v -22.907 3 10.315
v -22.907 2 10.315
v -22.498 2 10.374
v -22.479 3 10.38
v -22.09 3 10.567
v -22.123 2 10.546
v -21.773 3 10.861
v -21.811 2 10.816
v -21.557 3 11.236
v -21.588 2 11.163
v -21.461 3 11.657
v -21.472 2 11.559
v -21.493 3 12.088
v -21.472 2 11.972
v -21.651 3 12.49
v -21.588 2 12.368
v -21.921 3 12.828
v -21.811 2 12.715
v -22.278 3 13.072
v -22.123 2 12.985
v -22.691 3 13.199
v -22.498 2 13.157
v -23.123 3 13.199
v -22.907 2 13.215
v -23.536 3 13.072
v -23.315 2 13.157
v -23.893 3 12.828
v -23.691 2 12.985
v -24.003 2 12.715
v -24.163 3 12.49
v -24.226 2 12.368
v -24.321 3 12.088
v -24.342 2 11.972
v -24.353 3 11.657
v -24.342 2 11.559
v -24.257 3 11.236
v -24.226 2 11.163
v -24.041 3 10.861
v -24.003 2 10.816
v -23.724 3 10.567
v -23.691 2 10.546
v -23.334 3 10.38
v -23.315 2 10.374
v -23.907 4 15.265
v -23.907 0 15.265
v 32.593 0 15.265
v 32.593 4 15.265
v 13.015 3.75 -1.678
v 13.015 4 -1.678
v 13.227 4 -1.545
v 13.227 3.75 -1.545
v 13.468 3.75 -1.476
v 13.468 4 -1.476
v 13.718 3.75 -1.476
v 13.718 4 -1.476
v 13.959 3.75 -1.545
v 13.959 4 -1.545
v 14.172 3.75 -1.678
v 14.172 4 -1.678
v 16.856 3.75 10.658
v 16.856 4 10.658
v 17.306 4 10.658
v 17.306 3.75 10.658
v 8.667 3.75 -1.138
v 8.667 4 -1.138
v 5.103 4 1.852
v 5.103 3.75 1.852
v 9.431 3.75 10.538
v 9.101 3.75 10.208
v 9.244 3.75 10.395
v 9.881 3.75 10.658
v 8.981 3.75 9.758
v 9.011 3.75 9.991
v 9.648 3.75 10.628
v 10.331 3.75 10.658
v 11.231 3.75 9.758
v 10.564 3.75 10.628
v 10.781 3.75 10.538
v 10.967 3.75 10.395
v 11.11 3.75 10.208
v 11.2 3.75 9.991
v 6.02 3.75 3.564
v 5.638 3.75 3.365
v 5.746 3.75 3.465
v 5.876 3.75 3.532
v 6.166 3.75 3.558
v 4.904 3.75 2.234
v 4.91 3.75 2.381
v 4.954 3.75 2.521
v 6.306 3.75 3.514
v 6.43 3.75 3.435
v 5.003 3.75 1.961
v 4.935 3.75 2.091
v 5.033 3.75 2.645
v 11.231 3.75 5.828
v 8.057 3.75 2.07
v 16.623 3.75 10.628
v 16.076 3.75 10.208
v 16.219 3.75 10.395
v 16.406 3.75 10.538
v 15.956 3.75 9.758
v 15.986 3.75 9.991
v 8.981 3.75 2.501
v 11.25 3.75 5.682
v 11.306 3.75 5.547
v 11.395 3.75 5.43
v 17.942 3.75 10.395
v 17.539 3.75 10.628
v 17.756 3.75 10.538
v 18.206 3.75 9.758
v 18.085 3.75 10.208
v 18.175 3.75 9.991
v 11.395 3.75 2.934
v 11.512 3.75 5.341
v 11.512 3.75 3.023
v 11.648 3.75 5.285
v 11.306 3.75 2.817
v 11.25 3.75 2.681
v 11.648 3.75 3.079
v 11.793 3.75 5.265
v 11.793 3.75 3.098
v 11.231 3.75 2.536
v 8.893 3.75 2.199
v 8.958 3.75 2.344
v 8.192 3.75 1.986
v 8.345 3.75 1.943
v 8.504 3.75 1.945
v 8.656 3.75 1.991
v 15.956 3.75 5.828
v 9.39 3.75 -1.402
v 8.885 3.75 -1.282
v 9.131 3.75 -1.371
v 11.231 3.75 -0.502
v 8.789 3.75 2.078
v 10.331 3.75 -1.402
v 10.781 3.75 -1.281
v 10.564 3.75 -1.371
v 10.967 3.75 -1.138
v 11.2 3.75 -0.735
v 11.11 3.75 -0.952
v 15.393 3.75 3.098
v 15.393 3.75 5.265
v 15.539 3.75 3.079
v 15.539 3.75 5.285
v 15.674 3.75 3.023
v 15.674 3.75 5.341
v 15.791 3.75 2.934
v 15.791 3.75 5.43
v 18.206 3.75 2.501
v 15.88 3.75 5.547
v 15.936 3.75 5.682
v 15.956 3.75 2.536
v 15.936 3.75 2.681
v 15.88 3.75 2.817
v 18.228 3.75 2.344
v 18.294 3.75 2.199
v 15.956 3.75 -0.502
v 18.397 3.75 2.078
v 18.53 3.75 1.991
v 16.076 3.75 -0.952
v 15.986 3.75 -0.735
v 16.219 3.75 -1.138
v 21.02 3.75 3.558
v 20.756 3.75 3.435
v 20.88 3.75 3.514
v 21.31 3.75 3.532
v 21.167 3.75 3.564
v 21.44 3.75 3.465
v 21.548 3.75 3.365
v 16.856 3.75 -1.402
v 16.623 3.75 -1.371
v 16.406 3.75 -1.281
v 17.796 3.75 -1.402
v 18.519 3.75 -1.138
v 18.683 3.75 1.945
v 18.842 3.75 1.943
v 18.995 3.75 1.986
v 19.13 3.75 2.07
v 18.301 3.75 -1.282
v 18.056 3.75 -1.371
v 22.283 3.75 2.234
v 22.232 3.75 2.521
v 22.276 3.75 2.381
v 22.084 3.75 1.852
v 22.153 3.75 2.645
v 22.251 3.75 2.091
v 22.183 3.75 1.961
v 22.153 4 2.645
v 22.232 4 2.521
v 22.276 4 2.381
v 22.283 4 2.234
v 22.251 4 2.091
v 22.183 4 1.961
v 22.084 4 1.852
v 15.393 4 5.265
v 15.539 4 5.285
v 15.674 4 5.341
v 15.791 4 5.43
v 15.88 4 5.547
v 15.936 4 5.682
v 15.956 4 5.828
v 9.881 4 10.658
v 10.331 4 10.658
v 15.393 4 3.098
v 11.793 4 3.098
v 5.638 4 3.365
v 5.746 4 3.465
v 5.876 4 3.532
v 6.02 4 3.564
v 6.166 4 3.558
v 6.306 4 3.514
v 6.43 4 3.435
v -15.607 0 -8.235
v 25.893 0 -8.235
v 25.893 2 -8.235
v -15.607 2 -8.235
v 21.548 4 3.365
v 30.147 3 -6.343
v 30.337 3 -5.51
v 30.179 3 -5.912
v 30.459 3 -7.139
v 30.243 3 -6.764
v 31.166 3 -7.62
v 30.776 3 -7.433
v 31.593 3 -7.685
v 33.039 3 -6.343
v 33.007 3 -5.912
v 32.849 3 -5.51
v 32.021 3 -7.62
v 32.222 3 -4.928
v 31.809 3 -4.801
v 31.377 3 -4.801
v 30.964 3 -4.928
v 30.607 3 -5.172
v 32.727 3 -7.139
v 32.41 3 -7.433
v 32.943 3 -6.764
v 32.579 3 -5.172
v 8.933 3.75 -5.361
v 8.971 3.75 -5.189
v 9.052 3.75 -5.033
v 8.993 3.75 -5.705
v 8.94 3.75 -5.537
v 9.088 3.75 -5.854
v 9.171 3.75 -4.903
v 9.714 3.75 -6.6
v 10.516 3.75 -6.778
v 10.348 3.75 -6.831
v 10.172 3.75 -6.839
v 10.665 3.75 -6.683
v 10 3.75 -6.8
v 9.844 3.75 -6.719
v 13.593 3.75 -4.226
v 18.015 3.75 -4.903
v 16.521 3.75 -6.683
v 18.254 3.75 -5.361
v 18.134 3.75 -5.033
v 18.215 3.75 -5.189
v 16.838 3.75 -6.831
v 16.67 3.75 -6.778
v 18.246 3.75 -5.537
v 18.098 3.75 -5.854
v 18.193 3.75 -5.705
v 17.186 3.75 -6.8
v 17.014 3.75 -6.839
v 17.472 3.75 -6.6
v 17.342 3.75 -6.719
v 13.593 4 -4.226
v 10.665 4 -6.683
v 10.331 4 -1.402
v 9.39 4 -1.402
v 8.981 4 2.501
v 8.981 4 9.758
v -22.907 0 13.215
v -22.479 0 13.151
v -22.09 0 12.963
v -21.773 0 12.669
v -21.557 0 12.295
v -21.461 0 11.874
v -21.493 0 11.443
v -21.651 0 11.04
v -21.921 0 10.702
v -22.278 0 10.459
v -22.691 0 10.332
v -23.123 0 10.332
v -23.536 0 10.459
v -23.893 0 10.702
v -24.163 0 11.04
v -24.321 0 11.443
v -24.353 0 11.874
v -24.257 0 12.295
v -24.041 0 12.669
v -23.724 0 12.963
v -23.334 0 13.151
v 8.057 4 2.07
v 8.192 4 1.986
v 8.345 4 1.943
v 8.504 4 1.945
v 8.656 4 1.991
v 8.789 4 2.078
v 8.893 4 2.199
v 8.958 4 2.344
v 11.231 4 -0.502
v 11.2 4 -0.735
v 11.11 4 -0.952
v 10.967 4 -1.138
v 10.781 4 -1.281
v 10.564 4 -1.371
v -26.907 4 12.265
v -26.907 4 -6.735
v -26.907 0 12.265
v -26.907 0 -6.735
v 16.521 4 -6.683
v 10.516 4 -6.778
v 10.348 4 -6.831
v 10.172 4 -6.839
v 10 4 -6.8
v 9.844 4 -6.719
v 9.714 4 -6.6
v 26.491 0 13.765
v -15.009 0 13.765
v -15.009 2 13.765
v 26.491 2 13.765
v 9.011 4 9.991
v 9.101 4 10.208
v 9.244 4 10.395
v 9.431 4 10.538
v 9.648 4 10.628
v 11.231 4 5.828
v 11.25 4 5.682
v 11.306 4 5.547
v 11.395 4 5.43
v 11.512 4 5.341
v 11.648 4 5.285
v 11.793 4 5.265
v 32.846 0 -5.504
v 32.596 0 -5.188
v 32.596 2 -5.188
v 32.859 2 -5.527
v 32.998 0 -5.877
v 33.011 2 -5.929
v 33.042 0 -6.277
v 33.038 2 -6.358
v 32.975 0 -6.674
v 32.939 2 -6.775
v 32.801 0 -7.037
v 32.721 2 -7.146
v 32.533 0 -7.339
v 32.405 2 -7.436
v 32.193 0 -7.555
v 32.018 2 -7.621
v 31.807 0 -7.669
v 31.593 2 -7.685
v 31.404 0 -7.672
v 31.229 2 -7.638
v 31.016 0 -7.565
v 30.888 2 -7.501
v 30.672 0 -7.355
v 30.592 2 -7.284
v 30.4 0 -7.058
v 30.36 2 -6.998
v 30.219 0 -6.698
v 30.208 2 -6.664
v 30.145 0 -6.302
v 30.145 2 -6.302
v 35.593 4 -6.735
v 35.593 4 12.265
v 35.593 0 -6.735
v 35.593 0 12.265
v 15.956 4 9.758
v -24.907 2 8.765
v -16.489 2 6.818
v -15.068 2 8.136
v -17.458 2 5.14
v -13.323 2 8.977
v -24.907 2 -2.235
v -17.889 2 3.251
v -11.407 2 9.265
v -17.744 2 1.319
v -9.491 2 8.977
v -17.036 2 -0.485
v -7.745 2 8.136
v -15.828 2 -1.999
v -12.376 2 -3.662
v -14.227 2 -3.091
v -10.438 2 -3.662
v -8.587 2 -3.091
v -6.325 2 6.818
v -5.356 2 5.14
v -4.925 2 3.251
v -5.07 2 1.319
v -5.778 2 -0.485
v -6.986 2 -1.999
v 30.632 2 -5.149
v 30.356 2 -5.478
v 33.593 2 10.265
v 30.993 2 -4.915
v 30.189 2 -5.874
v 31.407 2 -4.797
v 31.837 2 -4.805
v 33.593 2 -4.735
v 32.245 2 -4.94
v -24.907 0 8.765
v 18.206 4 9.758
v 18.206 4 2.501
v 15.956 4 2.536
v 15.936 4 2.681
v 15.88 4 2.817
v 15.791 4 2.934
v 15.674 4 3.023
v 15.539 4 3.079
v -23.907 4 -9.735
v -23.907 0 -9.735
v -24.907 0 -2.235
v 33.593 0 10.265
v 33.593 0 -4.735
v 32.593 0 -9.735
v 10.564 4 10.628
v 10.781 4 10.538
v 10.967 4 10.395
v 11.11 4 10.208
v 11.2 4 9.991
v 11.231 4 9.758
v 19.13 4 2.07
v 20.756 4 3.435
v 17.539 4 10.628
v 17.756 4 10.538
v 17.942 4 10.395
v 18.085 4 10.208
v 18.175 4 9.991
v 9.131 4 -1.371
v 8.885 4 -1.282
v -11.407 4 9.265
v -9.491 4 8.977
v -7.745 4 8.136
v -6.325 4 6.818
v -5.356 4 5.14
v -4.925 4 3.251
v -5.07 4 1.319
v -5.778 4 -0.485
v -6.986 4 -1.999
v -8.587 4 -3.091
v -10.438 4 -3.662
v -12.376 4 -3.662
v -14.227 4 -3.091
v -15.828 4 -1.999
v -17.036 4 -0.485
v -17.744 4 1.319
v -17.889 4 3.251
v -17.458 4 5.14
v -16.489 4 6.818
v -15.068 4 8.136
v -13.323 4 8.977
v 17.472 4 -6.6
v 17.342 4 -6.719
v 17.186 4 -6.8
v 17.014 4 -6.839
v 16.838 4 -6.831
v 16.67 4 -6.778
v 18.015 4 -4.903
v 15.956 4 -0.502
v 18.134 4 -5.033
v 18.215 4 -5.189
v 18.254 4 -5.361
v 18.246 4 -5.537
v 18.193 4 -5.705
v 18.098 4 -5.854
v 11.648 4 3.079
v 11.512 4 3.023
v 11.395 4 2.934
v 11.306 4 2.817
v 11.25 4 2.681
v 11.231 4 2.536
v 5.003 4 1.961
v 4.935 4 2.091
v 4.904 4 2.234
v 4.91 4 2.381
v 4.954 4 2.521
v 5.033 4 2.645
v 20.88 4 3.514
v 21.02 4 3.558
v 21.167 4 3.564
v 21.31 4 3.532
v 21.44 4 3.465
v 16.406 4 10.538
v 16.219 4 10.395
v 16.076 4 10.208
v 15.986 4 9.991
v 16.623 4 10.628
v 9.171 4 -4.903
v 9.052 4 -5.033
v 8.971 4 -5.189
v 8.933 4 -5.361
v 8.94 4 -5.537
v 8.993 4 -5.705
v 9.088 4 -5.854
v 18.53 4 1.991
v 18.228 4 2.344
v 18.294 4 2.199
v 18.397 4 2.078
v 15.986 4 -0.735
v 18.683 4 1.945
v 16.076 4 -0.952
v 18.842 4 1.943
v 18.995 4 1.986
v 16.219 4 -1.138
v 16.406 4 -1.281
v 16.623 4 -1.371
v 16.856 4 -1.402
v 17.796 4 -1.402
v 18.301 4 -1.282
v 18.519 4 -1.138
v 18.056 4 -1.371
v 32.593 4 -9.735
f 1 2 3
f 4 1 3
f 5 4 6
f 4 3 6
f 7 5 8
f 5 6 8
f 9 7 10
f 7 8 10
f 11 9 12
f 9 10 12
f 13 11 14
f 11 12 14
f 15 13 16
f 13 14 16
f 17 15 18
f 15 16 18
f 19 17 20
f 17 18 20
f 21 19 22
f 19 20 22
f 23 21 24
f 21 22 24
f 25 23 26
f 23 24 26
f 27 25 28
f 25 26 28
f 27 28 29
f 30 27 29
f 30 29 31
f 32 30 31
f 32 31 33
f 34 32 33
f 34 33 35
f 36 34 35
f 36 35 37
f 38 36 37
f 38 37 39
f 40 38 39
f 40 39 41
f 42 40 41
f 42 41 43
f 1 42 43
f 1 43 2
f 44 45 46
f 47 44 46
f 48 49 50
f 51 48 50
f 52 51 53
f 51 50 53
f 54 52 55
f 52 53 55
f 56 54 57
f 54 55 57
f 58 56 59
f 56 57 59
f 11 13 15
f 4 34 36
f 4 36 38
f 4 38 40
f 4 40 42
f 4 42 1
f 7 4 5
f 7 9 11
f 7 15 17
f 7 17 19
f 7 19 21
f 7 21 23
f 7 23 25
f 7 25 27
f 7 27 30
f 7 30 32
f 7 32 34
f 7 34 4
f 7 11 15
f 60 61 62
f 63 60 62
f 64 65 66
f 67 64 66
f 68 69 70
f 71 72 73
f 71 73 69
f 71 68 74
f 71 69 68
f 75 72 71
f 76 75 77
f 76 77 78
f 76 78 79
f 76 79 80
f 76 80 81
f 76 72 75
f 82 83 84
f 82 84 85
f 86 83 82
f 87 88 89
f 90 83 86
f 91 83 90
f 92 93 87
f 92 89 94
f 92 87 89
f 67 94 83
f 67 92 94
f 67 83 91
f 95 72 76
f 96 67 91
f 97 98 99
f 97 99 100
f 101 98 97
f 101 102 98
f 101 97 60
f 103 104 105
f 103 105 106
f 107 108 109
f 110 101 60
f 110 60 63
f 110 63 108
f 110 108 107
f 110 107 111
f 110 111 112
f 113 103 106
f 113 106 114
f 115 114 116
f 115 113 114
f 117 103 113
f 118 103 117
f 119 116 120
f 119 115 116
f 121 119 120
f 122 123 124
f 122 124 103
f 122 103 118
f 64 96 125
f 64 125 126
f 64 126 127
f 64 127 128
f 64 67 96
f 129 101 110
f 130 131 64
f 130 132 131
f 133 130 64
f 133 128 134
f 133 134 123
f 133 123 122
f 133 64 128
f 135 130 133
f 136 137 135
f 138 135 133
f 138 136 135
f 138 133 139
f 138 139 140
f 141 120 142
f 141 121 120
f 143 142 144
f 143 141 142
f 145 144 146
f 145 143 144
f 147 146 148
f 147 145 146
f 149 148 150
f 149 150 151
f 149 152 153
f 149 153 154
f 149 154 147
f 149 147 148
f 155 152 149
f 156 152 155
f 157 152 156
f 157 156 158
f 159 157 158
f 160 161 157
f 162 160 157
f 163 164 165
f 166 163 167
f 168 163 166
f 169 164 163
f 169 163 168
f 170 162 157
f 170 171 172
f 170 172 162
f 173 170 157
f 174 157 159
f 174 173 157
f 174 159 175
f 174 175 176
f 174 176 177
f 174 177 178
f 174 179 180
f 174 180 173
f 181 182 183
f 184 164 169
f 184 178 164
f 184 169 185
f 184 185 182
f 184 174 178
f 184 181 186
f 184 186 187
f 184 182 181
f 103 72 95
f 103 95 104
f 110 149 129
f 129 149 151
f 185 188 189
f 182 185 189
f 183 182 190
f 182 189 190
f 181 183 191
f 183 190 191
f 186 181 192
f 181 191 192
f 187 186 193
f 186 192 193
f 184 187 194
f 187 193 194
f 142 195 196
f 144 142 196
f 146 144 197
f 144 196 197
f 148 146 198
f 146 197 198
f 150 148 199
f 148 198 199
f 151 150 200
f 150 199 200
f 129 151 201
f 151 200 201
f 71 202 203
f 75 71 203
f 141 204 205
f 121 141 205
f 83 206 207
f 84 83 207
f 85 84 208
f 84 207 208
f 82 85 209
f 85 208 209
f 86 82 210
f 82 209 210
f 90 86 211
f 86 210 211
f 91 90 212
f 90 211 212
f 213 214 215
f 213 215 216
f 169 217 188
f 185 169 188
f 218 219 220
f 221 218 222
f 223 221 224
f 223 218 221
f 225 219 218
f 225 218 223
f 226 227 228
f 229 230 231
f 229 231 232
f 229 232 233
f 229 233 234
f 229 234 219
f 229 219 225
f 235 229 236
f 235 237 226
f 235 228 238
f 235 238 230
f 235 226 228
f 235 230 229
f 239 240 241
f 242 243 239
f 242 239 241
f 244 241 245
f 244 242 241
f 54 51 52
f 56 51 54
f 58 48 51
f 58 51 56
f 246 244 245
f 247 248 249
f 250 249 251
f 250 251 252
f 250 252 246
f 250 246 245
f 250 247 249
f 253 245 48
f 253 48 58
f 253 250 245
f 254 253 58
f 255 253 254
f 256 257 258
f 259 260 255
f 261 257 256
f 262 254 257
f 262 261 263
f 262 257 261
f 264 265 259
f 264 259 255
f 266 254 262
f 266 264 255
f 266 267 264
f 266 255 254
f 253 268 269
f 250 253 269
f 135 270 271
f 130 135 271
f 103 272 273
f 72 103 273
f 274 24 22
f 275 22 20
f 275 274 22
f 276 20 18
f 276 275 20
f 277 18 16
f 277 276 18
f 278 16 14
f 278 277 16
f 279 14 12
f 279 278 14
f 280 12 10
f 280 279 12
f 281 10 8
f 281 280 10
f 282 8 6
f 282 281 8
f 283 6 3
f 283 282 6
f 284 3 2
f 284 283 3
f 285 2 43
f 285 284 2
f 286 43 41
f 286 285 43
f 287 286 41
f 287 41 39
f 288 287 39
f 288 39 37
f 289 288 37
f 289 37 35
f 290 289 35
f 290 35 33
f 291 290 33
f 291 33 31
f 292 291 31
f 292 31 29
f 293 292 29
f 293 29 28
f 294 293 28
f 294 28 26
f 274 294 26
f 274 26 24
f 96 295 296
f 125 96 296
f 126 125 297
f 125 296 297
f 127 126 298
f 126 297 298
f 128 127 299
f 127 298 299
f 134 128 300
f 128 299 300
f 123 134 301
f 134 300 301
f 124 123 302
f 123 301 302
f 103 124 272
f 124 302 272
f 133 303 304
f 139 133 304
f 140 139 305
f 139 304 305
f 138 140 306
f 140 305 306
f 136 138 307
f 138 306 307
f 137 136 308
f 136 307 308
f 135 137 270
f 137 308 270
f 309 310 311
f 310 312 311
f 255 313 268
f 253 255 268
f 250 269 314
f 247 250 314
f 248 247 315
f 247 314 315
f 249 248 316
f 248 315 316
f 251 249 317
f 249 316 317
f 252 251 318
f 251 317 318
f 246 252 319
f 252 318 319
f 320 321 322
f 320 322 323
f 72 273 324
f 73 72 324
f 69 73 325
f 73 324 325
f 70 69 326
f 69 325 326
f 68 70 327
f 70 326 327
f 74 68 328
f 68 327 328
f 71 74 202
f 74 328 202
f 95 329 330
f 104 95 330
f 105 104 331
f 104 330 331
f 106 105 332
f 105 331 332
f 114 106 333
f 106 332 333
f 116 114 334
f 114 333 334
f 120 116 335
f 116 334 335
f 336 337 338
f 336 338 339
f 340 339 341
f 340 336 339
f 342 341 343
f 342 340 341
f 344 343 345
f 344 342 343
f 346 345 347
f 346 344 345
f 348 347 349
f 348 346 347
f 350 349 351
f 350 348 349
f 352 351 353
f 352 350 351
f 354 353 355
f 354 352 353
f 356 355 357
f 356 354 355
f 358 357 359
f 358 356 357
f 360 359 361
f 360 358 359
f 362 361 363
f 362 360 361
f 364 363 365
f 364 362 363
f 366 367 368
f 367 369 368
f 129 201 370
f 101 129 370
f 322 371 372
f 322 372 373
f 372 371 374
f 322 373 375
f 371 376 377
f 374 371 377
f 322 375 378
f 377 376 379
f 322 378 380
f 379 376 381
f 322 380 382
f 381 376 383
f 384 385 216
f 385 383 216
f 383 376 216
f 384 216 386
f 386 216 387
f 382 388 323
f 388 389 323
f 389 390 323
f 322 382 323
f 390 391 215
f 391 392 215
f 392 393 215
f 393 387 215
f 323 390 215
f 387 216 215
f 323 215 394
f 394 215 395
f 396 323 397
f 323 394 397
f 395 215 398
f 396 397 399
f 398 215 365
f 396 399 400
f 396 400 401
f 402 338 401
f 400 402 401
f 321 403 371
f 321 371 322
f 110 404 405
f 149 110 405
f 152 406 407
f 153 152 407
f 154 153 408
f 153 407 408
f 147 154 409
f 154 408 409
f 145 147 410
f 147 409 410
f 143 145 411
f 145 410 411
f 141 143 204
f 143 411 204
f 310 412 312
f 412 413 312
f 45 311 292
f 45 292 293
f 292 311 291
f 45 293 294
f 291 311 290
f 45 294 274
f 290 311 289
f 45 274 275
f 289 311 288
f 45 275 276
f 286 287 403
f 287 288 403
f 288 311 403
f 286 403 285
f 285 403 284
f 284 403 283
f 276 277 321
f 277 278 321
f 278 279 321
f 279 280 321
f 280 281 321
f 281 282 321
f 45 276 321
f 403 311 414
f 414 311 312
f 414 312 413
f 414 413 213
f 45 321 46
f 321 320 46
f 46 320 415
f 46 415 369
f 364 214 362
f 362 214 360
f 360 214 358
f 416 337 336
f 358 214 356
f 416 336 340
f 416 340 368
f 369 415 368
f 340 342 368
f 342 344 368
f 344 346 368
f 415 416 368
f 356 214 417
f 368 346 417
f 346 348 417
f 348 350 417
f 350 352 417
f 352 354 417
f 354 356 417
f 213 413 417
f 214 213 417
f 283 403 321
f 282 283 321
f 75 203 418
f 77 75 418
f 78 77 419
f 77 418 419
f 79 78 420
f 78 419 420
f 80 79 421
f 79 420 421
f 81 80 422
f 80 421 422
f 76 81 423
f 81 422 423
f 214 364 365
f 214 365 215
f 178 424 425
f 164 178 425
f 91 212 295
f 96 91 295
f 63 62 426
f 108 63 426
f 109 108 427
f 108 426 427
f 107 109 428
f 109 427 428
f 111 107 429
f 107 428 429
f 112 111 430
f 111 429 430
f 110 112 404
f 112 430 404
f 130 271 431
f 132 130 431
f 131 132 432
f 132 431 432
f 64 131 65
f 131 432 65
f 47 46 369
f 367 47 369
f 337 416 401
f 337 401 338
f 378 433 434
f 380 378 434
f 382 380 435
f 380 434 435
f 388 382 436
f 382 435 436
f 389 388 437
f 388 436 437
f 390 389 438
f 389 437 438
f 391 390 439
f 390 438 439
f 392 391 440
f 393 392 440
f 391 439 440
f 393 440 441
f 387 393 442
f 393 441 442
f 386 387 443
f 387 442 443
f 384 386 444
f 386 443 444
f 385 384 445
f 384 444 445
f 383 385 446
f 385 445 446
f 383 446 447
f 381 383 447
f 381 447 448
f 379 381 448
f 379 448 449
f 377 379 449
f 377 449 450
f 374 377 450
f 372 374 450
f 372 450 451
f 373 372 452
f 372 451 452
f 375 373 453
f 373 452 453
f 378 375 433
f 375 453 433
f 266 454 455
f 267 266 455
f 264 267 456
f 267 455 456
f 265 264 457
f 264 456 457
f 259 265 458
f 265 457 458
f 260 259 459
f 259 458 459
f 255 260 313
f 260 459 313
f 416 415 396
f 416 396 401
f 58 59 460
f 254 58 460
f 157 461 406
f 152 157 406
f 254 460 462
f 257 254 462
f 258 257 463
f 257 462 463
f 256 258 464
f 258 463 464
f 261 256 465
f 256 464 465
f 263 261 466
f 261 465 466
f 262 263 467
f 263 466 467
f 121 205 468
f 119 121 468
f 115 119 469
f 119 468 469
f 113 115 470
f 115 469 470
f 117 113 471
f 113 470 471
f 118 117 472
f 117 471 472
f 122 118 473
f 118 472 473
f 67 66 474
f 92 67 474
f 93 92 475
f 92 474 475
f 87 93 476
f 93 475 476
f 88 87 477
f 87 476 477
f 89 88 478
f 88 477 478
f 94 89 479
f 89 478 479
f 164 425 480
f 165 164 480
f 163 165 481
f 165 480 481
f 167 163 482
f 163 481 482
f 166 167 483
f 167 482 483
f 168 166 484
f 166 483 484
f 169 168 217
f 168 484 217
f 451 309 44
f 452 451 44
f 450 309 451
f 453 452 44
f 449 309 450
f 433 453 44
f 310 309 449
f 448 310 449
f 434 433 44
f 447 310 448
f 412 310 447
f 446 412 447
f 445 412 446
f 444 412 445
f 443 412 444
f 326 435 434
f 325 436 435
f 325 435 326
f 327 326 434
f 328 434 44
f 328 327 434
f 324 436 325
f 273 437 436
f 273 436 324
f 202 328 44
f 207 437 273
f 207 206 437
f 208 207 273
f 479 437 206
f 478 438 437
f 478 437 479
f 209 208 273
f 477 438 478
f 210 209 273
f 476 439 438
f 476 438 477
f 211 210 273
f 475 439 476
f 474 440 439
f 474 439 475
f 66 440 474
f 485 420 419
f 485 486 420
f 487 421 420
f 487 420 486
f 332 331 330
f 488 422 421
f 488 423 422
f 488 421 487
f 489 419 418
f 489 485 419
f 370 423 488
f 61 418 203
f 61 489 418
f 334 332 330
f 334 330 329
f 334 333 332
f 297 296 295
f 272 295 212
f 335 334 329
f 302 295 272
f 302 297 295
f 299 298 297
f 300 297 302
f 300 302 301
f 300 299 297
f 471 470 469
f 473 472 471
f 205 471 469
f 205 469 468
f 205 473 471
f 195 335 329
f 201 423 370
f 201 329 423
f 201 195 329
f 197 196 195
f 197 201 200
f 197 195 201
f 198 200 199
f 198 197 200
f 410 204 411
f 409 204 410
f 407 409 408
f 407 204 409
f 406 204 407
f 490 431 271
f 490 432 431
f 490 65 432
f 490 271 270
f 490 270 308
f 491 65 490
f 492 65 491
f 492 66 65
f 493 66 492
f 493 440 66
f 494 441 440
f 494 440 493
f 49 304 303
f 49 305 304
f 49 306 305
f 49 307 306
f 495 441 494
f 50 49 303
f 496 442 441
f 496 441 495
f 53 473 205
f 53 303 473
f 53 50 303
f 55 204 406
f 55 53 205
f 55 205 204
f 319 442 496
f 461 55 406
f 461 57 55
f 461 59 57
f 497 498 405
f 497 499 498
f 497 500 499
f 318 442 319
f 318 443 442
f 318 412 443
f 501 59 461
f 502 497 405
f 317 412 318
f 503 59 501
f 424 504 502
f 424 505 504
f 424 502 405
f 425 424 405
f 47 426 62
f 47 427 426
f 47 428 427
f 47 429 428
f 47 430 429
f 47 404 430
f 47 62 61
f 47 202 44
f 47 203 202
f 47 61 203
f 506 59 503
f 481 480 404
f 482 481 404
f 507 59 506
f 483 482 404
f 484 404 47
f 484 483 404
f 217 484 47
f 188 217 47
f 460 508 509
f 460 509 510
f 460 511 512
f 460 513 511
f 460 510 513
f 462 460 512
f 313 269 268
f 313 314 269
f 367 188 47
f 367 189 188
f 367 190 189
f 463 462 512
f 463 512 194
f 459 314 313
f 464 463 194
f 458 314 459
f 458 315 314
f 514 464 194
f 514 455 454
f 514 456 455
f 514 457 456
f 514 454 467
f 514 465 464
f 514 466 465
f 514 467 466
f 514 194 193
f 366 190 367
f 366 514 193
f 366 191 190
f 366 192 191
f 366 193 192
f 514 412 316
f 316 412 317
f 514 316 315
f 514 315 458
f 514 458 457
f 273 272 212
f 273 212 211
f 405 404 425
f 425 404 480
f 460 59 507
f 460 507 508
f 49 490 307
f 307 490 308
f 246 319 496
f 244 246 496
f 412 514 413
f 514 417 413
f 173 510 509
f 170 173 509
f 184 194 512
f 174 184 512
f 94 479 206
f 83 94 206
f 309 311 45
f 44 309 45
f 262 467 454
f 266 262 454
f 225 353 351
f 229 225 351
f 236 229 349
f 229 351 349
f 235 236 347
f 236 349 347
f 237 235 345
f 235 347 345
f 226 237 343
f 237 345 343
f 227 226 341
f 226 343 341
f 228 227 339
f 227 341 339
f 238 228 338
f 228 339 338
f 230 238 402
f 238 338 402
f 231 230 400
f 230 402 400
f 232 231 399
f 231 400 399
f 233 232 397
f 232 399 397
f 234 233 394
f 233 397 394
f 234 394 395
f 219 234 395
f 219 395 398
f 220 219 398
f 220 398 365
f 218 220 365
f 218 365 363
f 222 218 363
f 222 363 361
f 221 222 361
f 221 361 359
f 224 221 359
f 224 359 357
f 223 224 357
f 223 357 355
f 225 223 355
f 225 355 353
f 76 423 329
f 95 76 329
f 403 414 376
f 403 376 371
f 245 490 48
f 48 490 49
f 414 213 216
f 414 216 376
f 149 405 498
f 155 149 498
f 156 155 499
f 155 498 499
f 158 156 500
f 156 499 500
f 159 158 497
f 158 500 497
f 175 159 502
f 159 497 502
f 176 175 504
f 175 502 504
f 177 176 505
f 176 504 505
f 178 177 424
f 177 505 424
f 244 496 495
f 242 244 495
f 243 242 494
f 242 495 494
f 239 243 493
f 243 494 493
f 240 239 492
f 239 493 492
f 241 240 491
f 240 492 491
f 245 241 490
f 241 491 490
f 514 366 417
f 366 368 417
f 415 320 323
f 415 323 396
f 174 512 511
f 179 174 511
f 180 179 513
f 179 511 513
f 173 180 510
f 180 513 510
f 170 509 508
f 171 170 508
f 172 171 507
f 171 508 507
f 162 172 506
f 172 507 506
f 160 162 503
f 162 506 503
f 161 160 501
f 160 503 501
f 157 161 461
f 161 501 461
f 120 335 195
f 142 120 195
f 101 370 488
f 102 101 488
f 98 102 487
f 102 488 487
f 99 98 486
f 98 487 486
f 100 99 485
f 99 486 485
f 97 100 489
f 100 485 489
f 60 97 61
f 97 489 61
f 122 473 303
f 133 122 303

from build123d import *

# Parameters (mm, degrees)
SKETCH_1_R          = 1.45
EXTRUDE_1_DEPTH     = 2
EXTRUDE_2_DEPTH     = 2
SKETCH_3_R          = 6.5
CUT_EXTRUDE_1_DEPTH = 2
SKETCH_4_R          = 1.45
CUT_EXTRUDE_2_DEPTH = 1
CUT_EXTRUDE_3_DEPTH = 0.25


with BuildPart() as part:
    # Эскиз1 → Бобышка-Вытянуть1 (new body)
    with BuildSketch(Plane(origin=(0, 0, 0), x_dir=(1, 0, 0), z_dir=(0, 1, 0))):
        Polygon((35.593108597, -12.265362584), (35.593108597, 6.734637416), (32.593108597, 9.734637416), (-23.906891403, 9.734637416), (-26.906891403, 6.734637416), (-26.906891403, -12.265362584), (-23.906891403, -15.265362584), (32.593108597, -15.265362584), align=None)
        with Locations(Location((-22.906891403, -11.765362584, 0), (0, 0, 270))):
            Circle(SKETCH_1_R, mode=Mode.SUBTRACT)
        with BuildLine():
            Line((25.893108597, 8.234637416), (-15.606891403, 8.234637416))
            Line((-15.606891403, 8.234637416), (-24.906891403, 2.234637416))
            Line((-24.906891403, 2.234637416), (-24.906891403, -8.765362584))
            Line((-24.906891403, -8.765362584), (-15.008932433, -13.765362584))
            Line((-15.008932433, -13.765362584), (26.491067567, -13.765362584))
            Line((26.491067567, -13.765362584), (33.593108597, -10.265362584))
            Line((33.593108597, -10.265362584), (33.593108597, 4.734637416))
            Line((33.593108597, 4.734637416), (32.596332637, 5.187717397))
            ThreePointArc((32.596332637, 5.187717397), (32.193122866, 7.554668808), (30.144679077, 6.302105379))
            Line((30.144679077, 6.302105379), (25.893108597, 8.234637416))
        make_face(mode=Mode.SUBTRACT)
    extrude(amount=EXTRUDE_1_DEPTH)

    # Эскиз2 → Бобышка-Вытянуть2 (add)
    with BuildSketch(Plane(origin=(0, 2, 0), x_dir=(1, 0, 0), z_dir=(0, 1, 0))):
        Polygon((32.593108597, -15.265362584), (35.593108597, -12.265362584), (35.593108597, 6.734637416), (32.593108597, 9.734637416), (-23.906891403, 9.734637416), (-26.906891403, 6.734637416), (-26.906891403, -12.265362584), (-23.906891403, -15.265362584), align=None)
    extrude(amount=EXTRUDE_2_DEPTH)

    # Эскиз3 → Вырез-Вытянуть1 (cut)
    with BuildSketch(Plane(origin=(0, 4, 0), x_dir=(1, 0, 0), z_dir=(0, 1, 0))):
        with Locations(Location((-11.406891403, -2.765362584, 0), (0, 0, 270))):
            Circle(SKETCH_3_R)
    extrude(amount=-CUT_EXTRUDE_1_DEPTH, mode=Mode.SUBTRACT)

    # Эскиз4 → Вырез-Вытянуть2 (cut)
    with BuildSketch(Plane.XZ.offset(-2)):
        with Locations(Location((31.593108597, -6.234637416, 0), (0, 0, 270))):
            Circle(SKETCH_4_R)
        with Locations(Location((-22.906891403, 11.765362584, 0), (0, 0, 270))):
            Circle(SKETCH_4_R)
    extrude(amount=-CUT_EXTRUDE_2_DEPTH, mode=Mode.SUBTRACT)

    # Эскиз5 → Вырез-Вытянуть3 (cut)
    with BuildSketch(Plane(origin=(0, 4, 0), x_dir=(1, 0, 0), z_dir=(0, 1, 0))):
        with BuildLine():
            Line((8.980608597, -2.500998747), (8.980608597, -9.758351134))
            ThreePointArc((8.980608597, -9.758351134), (9.244212494, -10.394747237), (9.880608597, -10.658351134))
            Line((9.880608597, -10.658351134), (10.330608597, -10.658351134))
            ThreePointArc((10.330608597, -10.658351134), (10.9670047, -10.394747237), (11.230608597, -9.758351134))
            Line((11.230608597, -9.758351134), (11.230608597, -5.827862584))
            ThreePointArc((11.230608597, -5.827862584), (11.395361032, -5.43011502), (11.793108597, -5.265362584))
            Line((11.793108597, -5.265362584), (15.393108597, -5.265362584))
            ThreePointArc((15.393108597, -5.265362584), (15.790856161, -5.43011502), (15.955608597, -5.827862584))
            Line((15.955608597, -5.827862584), (15.955608597, -9.758351134))
            ThreePointArc((15.955608597, -9.758351134), (16.219212494, -10.394747237), (16.855608597, -10.658351134))
            Line((16.855608597, -10.658351134), (17.305608597, -10.658351134))
            ThreePointArc((17.305608597, -10.658351134), (17.9420047, -10.394747237), (18.205608597, -9.758351134))
            Line((18.205608597, -9.758351134), (18.205608597, -2.500998747))
            ThreePointArc((18.205608597, -2.500998747), (18.530385824, -1.991200617), (19.129676627, -2.070098747))
            Line((19.129676627, -2.070098747), (20.756009257, -3.434753858))
            ThreePointArc((20.756009257, -3.434753858), (21.166602393, -3.564213376), (21.548477287, -3.365421889))
            Line((21.548477287, -3.365421889), (22.153040559, -2.644931438))
            ThreePointArc((22.153040559, -2.644931438), (22.282500077, -2.234338302), (22.08370859, -1.852463408))
            Line((22.08370859, -1.852463408), (18.519278144, 1.138448864))
            ThreePointArc((18.519278144, 1.138448864), (18.180914744, 1.333803064), (17.796142083, 1.401648866))
            Line((17.796142083, 1.401648866), (16.855608597, 1.401648866))
            ThreePointArc((16.855608597, 1.401648866), (16.219212494, 1.138044969), (15.955608597, 0.501648866))
            Line((15.955608597, 0.501648866), (15.955608597, -2.535851134))
            ThreePointArc((15.955608597, -2.535851134), (15.790856161, -2.933598699), (15.393108597, -3.098351134))
            Line((15.393108597, -3.098351134), (11.793108597, -3.098351134))
            ThreePointArc((11.793108597, -3.098351134), (11.395361032, -2.933598699), (11.230608597, -2.535851134))
            Line((11.230608597, -2.535851134), (11.230608597, 0.501648866))
            ThreePointArc((11.230608597, 0.501648866), (10.9670047, 1.138044969), (10.330608597, 1.401648866))
            Line((10.330608597, 1.401648866), (9.39007511, 1.401648866))
            ThreePointArc((9.39007511, 1.401648866), (9.005302449, 1.333803064), (8.666939049, 1.138448864))
            Line((8.666939049, 1.138448864), (5.102508603, -1.852463408))
            ThreePointArc((5.102508603, -1.852463408), (4.903717116, -2.234338302), (5.033176634, -2.644931438))
            Line((5.033176634, -2.644931438), (5.637739906, -3.365421889))
            ThreePointArc((5.637739906, -3.365421889), (6.0196148, -3.564213376), (6.430207936, -3.434753858))
            Line((6.430207936, -3.434753858), (8.056540566, -2.070098747))
            ThreePointArc((8.056540566, -2.070098747), (8.655831369, -1.991200617), (8.980608597, -2.500998747))
        make_face()
        with BuildLine():
            Line((13.593108597, 4.226315266), (10.66501019, 6.683281559))
            ThreePointArc((10.66501019, 6.683281559), (10.172298427, 6.838632981), (9.714048554, 6.600083196))
            Line((9.714048554, 6.600083196), (9.08803108, 5.854024623))
            ThreePointArc((9.08803108, 5.854024623), (8.932679658, 5.36131286), (9.171229443, 4.903062987))
            Line((9.171229443, 4.903062987), (13.014599748, 1.678092382))
            ThreePointArc((13.014599748, 1.678092382), (13.593108597, 1.467532381), (14.171617445, 1.678092382))
            Line((14.171617445, 1.678092382), (18.01498775, 4.903062987))
            ThreePointArc((18.01498775, 4.903062987), (18.253537535, 5.36131286), (18.098186113, 5.854024623))
            Line((18.098186113, 5.854024623), (17.472168639, 6.600083196))
            ThreePointArc((17.472168639, 6.600083196), (17.013918766, 6.838632981), (16.521207003, 6.683281559))
            Line((16.521207003, 6.683281559), (13.593108597, 4.226315266))
        make_face()
    extrude(amount=-CUT_EXTRUDE_3_DEPTH, mode=Mode.SUBTRACT)


solid = part.part
